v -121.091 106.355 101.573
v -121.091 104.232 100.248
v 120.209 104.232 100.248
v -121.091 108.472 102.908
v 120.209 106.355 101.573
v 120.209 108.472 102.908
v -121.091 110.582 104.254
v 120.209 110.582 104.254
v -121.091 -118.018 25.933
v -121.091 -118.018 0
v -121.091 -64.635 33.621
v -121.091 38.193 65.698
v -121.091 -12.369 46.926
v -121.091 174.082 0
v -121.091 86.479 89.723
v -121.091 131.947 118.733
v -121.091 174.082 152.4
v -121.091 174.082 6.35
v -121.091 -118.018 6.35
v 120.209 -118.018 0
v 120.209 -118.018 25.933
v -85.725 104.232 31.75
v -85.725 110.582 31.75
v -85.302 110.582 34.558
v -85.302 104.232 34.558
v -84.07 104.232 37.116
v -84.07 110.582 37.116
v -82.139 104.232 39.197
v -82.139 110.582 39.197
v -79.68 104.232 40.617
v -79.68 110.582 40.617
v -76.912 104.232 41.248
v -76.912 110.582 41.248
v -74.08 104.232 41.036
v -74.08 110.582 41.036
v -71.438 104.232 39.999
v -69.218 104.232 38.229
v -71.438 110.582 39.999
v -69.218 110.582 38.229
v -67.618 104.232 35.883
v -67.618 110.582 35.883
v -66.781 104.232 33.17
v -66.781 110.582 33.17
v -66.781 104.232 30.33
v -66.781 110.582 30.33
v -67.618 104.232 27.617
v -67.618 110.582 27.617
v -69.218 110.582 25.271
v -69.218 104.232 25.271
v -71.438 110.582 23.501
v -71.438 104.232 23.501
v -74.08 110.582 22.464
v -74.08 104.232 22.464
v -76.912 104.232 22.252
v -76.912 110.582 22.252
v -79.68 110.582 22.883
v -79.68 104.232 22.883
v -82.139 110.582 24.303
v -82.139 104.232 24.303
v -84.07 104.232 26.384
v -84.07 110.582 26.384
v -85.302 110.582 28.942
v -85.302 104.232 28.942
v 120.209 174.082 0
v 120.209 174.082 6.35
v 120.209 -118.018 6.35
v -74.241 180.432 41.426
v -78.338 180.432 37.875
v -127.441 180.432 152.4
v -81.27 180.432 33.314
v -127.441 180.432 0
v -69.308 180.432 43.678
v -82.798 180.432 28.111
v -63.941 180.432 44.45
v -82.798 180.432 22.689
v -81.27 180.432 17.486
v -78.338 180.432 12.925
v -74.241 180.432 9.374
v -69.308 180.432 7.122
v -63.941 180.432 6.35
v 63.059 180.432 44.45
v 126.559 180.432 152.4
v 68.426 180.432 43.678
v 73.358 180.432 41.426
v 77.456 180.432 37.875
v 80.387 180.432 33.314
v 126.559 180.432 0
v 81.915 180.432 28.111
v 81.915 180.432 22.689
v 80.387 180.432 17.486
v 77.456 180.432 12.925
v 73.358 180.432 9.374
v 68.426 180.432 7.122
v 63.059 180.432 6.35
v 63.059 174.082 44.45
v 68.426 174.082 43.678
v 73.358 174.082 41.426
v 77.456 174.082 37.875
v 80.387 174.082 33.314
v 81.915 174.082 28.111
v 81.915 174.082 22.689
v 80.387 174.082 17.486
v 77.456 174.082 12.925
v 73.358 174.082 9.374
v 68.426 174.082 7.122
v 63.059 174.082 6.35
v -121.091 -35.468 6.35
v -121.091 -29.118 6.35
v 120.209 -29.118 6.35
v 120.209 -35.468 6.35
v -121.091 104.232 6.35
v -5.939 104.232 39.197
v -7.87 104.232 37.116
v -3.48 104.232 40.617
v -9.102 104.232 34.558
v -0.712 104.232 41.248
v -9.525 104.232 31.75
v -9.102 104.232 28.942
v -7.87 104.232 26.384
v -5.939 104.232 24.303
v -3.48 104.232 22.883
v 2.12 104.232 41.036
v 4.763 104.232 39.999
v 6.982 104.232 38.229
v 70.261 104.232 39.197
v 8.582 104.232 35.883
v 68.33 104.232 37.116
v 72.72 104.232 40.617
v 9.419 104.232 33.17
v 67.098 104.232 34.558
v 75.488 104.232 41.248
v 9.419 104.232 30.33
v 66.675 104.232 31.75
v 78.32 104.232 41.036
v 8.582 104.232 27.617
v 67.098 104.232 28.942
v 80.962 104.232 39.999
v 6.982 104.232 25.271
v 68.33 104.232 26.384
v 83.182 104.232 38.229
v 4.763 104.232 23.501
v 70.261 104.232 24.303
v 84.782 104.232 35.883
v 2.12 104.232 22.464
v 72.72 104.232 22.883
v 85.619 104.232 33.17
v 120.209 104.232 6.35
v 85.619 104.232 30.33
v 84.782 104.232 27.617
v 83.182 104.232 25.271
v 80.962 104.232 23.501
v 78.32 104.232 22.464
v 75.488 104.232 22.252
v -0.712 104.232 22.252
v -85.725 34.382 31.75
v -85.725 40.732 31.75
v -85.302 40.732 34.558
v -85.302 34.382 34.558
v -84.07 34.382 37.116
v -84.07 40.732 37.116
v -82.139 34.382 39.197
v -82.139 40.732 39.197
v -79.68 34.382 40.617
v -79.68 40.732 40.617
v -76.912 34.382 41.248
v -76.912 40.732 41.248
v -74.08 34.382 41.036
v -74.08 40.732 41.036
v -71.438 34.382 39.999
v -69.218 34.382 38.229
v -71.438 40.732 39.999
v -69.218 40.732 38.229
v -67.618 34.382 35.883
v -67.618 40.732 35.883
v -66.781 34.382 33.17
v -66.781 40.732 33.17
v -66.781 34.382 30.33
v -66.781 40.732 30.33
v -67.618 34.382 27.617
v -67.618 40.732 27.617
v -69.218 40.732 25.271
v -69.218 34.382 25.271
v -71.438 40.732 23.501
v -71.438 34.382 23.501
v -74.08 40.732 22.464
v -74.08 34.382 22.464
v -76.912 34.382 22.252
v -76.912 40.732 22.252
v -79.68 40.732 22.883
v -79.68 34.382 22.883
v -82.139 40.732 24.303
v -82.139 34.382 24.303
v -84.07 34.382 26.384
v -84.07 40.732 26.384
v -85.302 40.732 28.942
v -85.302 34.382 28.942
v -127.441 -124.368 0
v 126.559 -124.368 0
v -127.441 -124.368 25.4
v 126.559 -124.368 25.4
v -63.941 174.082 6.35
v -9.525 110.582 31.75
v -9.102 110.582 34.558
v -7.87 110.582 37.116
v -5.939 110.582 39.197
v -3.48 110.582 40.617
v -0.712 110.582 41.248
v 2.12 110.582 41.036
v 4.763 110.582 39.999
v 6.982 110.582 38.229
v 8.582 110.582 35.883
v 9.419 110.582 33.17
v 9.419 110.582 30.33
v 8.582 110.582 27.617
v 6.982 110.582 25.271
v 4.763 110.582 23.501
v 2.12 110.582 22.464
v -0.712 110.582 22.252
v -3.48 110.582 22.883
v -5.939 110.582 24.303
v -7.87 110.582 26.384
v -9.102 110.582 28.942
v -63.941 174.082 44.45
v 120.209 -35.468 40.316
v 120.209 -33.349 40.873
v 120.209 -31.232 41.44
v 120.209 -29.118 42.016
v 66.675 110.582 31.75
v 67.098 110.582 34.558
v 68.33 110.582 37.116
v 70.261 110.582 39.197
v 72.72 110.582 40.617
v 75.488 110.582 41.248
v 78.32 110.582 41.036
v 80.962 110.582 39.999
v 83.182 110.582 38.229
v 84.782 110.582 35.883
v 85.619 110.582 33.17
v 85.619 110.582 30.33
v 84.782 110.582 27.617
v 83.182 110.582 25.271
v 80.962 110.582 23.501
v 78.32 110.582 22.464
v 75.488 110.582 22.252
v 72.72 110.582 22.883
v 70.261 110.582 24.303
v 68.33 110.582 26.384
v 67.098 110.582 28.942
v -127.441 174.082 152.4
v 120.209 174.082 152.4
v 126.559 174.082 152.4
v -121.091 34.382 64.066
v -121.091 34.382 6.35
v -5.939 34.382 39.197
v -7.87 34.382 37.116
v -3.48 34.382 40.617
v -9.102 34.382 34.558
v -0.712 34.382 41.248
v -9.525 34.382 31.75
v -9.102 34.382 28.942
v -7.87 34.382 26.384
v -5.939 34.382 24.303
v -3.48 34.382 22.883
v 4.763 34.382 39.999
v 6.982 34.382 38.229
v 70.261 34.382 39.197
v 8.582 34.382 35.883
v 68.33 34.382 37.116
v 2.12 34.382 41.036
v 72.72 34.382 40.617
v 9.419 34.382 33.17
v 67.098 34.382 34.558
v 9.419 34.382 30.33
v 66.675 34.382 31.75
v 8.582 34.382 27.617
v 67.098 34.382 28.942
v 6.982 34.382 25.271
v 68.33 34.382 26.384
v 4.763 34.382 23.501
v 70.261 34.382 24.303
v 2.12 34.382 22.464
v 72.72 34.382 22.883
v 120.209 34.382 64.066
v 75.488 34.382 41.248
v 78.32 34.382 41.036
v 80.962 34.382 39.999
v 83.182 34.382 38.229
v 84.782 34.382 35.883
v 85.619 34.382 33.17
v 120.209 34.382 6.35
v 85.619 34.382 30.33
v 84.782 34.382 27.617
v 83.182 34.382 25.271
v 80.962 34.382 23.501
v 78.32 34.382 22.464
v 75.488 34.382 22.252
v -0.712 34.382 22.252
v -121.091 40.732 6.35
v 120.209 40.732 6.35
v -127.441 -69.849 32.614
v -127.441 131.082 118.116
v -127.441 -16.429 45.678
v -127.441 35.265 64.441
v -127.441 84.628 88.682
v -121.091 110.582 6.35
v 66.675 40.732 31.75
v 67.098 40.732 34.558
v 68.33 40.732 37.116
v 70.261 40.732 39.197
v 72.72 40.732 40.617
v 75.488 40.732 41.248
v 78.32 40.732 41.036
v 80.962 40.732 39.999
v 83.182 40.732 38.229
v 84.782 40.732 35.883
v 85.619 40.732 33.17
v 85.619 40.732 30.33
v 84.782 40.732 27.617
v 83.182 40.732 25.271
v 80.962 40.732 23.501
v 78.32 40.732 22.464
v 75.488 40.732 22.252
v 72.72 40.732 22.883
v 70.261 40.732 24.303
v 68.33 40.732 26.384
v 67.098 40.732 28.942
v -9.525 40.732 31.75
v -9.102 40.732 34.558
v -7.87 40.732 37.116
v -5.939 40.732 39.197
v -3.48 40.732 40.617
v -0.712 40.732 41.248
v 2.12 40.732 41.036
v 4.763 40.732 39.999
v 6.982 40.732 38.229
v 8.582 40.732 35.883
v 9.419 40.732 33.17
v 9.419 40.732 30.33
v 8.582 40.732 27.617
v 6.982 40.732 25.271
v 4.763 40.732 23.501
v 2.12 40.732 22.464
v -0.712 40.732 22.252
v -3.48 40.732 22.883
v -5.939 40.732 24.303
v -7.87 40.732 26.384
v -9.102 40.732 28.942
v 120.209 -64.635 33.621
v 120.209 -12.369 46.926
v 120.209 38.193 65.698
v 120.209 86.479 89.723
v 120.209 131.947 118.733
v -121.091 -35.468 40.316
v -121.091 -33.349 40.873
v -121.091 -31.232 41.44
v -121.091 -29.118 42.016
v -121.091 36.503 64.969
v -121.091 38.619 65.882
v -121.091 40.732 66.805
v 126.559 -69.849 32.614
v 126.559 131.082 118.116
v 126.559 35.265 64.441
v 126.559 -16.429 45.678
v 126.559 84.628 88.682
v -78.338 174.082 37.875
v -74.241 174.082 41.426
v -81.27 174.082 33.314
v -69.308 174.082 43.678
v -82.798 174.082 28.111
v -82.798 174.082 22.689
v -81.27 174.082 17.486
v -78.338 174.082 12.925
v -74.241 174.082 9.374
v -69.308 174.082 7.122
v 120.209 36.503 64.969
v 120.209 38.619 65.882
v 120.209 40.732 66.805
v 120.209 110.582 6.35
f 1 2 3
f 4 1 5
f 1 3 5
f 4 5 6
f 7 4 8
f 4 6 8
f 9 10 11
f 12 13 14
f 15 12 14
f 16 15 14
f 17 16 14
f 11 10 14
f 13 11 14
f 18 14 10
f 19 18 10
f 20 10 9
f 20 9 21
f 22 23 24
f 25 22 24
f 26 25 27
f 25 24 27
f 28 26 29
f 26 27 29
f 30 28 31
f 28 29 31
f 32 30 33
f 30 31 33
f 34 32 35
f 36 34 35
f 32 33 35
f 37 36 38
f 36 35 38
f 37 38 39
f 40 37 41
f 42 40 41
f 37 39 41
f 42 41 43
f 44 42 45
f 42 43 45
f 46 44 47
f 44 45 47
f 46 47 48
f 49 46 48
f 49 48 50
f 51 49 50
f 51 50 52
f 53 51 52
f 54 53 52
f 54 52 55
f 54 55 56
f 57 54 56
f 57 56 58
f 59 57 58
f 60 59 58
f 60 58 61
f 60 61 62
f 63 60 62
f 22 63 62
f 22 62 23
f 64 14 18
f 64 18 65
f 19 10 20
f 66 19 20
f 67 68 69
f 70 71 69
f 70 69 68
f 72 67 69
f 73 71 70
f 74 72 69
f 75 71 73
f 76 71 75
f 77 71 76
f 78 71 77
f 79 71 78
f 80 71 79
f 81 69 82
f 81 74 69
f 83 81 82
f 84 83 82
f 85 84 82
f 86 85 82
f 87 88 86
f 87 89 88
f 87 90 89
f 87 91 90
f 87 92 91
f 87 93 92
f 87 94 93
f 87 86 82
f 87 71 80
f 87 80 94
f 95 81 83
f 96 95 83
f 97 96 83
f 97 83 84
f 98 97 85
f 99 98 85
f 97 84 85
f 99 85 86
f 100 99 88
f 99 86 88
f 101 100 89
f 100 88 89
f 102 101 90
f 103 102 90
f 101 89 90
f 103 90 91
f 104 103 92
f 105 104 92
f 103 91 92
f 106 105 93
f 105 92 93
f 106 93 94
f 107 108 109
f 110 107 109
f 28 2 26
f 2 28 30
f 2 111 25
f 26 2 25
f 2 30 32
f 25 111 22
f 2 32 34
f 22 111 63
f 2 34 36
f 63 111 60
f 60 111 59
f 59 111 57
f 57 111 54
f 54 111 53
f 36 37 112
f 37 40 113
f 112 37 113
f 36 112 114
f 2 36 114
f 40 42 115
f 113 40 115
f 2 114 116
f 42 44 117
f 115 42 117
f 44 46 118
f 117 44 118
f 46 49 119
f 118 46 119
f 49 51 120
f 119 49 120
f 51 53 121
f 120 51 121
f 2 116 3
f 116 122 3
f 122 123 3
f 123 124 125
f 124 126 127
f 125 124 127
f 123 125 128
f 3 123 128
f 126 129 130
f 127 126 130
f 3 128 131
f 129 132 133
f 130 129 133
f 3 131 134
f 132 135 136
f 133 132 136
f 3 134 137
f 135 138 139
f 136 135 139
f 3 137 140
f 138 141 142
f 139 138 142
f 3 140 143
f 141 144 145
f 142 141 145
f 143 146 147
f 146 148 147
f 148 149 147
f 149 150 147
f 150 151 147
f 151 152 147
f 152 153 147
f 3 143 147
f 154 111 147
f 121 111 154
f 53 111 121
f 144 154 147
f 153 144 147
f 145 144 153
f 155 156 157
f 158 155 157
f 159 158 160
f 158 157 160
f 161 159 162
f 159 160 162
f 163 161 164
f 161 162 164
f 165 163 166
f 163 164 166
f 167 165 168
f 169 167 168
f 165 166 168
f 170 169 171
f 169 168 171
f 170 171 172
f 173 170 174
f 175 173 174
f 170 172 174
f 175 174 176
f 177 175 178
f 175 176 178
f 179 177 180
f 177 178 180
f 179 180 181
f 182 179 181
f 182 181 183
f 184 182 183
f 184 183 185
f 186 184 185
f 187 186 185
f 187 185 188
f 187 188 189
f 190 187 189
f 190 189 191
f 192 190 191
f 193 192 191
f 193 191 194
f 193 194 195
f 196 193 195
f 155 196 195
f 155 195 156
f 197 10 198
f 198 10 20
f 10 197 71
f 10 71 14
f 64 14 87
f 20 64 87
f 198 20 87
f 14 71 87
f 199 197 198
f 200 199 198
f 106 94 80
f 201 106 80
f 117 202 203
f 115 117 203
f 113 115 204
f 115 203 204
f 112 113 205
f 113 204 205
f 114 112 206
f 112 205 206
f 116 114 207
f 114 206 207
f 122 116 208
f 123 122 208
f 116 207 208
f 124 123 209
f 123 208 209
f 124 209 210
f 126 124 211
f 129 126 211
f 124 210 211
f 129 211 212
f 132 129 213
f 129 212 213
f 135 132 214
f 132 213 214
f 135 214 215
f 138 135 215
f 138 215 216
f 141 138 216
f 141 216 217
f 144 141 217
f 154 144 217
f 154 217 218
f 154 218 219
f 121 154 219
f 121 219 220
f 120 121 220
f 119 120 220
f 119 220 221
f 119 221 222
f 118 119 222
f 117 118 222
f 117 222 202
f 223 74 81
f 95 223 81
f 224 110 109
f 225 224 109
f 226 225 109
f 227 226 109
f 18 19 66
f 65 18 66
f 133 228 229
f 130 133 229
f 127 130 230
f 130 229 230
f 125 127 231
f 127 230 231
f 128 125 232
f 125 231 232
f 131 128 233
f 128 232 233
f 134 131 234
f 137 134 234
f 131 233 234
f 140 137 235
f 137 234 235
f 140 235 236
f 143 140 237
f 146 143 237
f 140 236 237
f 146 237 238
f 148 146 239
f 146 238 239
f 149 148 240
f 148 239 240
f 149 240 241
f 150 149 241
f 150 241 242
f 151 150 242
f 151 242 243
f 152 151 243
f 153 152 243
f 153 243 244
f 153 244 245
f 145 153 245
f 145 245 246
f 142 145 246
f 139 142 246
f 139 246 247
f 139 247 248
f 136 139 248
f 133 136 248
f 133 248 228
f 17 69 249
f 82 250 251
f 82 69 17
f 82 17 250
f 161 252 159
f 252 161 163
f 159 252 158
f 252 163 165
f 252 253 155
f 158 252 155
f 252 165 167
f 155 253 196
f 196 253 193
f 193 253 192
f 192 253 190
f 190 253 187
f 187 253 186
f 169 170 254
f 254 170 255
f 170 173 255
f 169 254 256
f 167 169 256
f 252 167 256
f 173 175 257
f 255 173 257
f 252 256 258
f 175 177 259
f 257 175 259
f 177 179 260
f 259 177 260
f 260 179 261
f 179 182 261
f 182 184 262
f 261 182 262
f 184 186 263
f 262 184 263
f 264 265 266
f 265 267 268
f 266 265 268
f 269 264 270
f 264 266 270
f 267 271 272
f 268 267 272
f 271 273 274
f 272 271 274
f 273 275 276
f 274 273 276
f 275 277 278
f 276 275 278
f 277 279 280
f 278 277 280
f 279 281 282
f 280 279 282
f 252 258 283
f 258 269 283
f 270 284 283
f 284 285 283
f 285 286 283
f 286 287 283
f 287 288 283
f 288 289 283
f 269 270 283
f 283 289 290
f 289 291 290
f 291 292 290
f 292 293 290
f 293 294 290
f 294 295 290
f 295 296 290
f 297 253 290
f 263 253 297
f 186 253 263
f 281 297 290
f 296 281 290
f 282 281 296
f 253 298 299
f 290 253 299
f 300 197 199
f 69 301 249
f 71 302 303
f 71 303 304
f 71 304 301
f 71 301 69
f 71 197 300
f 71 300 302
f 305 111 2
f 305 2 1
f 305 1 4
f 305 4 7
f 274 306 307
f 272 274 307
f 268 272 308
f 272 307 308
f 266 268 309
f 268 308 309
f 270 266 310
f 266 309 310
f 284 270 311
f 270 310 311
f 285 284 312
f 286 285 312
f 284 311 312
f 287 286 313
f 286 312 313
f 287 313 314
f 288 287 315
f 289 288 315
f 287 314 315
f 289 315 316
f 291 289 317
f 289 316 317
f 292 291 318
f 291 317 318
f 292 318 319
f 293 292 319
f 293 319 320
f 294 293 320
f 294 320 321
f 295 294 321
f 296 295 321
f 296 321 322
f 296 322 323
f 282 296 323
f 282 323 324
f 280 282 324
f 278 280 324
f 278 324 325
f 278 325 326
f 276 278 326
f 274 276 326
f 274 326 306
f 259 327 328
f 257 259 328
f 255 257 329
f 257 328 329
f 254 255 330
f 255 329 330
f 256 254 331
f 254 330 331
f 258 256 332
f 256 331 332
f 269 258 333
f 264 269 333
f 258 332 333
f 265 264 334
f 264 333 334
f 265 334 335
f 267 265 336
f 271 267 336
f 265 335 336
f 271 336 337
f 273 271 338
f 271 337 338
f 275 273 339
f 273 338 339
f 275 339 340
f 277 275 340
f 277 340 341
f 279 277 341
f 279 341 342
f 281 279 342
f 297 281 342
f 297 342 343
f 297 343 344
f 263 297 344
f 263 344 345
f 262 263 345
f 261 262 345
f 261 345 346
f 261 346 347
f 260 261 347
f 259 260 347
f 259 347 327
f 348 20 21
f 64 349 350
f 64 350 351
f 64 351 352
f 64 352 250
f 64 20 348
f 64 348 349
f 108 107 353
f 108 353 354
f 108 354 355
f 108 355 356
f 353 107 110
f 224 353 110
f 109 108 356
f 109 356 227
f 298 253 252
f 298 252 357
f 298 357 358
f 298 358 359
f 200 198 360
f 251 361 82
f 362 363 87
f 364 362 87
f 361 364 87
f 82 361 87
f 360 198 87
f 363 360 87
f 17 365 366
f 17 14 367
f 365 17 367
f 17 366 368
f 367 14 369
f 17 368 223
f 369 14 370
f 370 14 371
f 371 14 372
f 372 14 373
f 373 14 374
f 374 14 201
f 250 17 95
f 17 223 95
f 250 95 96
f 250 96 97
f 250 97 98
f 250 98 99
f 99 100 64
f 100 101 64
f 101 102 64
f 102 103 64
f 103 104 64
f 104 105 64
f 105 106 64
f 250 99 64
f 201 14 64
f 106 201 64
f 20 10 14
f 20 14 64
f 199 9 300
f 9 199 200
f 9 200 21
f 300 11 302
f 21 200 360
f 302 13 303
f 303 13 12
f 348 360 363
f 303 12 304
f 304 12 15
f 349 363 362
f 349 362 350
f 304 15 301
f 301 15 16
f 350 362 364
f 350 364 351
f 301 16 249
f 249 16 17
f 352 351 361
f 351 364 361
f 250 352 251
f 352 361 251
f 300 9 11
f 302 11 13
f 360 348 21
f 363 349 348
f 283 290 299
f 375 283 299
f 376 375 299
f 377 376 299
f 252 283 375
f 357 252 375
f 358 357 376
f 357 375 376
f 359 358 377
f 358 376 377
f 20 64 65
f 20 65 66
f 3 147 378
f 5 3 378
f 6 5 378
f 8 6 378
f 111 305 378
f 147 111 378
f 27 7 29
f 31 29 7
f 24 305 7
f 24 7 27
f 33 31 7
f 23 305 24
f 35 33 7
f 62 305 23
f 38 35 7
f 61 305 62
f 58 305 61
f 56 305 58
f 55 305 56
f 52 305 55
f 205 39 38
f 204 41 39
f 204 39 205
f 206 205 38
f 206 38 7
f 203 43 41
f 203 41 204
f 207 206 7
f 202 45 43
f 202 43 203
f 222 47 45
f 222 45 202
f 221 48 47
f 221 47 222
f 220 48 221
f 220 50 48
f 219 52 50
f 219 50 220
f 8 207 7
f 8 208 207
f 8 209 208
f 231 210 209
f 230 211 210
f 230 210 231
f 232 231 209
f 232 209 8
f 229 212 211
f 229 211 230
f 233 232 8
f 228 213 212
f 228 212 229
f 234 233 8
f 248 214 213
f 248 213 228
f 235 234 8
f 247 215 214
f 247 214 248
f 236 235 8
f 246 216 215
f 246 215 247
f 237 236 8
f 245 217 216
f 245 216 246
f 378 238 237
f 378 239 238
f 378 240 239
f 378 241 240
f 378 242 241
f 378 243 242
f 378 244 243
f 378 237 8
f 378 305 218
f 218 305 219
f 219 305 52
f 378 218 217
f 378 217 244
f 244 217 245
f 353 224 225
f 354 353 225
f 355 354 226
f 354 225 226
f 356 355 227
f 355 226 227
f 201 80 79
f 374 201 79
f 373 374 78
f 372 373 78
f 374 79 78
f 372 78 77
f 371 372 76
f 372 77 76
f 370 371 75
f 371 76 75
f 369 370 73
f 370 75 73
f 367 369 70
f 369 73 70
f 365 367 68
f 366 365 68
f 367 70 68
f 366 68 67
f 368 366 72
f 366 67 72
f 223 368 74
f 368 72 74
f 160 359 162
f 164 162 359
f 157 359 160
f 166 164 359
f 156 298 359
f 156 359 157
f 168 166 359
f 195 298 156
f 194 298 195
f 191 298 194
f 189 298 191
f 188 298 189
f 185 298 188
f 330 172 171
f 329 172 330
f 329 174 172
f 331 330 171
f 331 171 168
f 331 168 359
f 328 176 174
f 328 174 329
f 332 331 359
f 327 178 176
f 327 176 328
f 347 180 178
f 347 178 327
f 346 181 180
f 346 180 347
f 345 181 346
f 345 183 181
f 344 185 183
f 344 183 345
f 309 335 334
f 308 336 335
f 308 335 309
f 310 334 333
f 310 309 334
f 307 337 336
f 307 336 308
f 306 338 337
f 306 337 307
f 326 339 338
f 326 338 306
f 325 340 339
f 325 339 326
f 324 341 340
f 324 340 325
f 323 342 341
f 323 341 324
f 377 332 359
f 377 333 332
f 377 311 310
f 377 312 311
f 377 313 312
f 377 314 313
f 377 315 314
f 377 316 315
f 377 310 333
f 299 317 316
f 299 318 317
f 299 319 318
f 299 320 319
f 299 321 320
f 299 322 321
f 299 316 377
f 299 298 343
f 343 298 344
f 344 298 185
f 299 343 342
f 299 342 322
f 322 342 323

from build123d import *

# Parameters (mm, degrees)
F0_W          = 254
F0_H          = 304.8
F0_W_2        = 241.3
F0_H_2        = 292.1
F1_DEPTH      = 152.4
F3_DEPTH      = 254
F4_W          = 241.3
F4_H          = 292.1
F5_DEPTH      = 6.35
F7_END_RADIUS = 508
F6_W          = 241.3
F6_H          = 6.35
F7_REACH      = 387.4345381711
F9_DEPTH      = 12.7
F10_R         = 9.525
F11_DEPTH     = 99.06
F12_R         = 9.525
F13_DEPTH     = 25.4


# Not quite as in the source:
# - a feature names something its author has since deleted; it is built from what else it names


with BuildPart() as f1:
    # F0 (on Top) → F1 (new body)
    with BuildSketch(Plane.XY):
        with Locations((-0.4414357245, 28.0319261778)):
            Rectangle(F0_W, F0_H)
        with Locations((-0.4414357245, 28.0319261778)):
            Rectangle(F0_W_2, F0_H_2, mode=Mode.SUBTRACT)
    extrude(amount=F1_DEPTH)

    # F2 (on face) → F3 (cut, through all)
    with BuildSketch(Plane.YZ.offset(126.5585642755)):
        with BuildLine():
            Line((-124.3680738222, 152.4), (-124.3680738222, 25.4))
            ThreePointArc((-124.3680738222, 25.4), (35.2650996978, 64.440792228), (174.0819261778, 152.4))
            Line((174.0819261778, 152.4), (-124.3680738222, 152.4))
        make_face()
    extrude(amount=-F3_DEPTH, mode=Mode.SUBTRACT)

    # F8 (on face) → F9 (cut)
    with BuildSketch(Plane(origin=(0, 180.4319261778, 0), x_dir=(-1, 0, 0), z_dir=(0, 1, 0))):
        with BuildLine():
            Line((63.9414357245, 44.45), (-63.0585642755, 44.45))
            ThreePointArc((-63.0585642755, 44.45), (-82.1085642755, 25.4), (-63.0585642755, 6.35))
            Line((-63.0585642755, 6.35), (63.9414357245, 6.35))
            ThreePointArc((63.9414357245, 6.35), (82.9914357245, 25.4), (63.9414357245, 44.45))
        make_face()
    extrude(amount=-F9_DEPTH, mode=Mode.SUBTRACT)

    # F12 (on face) → F13 (cut)
    with BuildSketch(Plane(origin=(0, 40.7319261778, 0), x_dir=(-1, 0, 0), z_dir=(0, 1, 0))):
        with Locations((0, 31.75)):
            Circle(F12_R)
        with Locations((-76.2, 31.75)):
            Circle(F12_R)
        with Locations((76.2, 31.75)):
            Circle(F12_R)
    extrude(amount=-F13_DEPTH, mode=Mode.SUBTRACT)


with BuildPart() as f5:
    # F4 (on face) → F5 (new body)
    with BuildSketch(Plane(origin=(0, 0, 0), x_dir=(1, 0, 0), z_dir=(0, 0, -1))):
        with Locations((-0.4414357245, -28.0319261778)):
            Rectangle(F4_W, F4_H)
    extrude(amount=-F5_DEPTH)


with BuildPart() as f7:
    f7_end = (Plane(origin=(-0.4414357245, -163.6449236636, 531.8793471273), x_dir=(0, 0, 1), z_dir=(1, 0, 0)) * Cylinder(F7_END_RADIUS, 1624.9156633008, mode=Mode.PRIVATE)).faces().sort_by_distance((122.4388870733, 35.2650996978, 64.440792228))[0]
    # F6 (on face) → F7 (new body, up to the whole of a round face its end follows)
    with BuildSketch(Plane.XY.offset(6.35)):
        with Locations((-0.4414357245, 37.5569261778)):
            Rectangle(F6_W, F6_H)
    f7_long = extrude(amount=F7_REACH, mode=Mode.PRIVATE)
    add(split(f7_long, bisect_by=f7_end, keep=Keep.TOP, mode=Mode.PRIVATE))


with BuildPart() as f7b:
    f7_2_end = (Plane(origin=(-0.4414357245, -163.6449236636, 531.8793471273), x_dir=(0, 0, 1), z_dir=(1, 0, 0)) * Cylinder(F7_END_RADIUS, 1624.9156633008, mode=Mode.PRIVATE)).faces().sort_by_distance((122.4388870733, 35.2650996978, 64.440792228))[0]
    # F6 (on face) → F7, piece 2 (new body, up to the whole of a round face its end follows)
    with BuildSketch(Plane.XY.offset(6.35)):
        with Locations((-0.4414357245, 107.4069261778)):
            Rectangle(F6_W, F6_H)
    f7_2_long = extrude(amount=F7_REACH, mode=Mode.PRIVATE)
    add(split(f7_2_long, bisect_by=f7_2_end, keep=Keep.TOP, mode=Mode.PRIVATE))


with BuildPart() as f7c:
    f7_3_end = (Plane(origin=(-0.4414357245, -163.6449236636, 531.8793471273), x_dir=(0, 0, 1), z_dir=(1, 0, 0)) * Cylinder(F7_END_RADIUS, 1624.9156633008, mode=Mode.PRIVATE)).faces().sort_by_distance((122.4388870733, 35.2650996978, 64.440792228))[0]
    # F6 (on face) → F7, piece 3 (new body, up to the whole of a round face its end follows)
    with BuildSketch(Plane.XY.offset(6.35)):
        with Locations((-0.4414357245, -32.2930738222)):
            Rectangle(F6_W, F6_H)
    f7_3_long = extrude(amount=F7_REACH, mode=Mode.PRIVATE)
    add(split(f7_3_long, bisect_by=f7_3_end, keep=Keep.TOP, mode=Mode.PRIVATE))


with BuildPart() as f11_tool:
    # F10 (on face) → F11 (new body)
    with BuildSketch(Plane(origin=(0, 110.5819261778, 0), x_dir=(-1, 0, 0), z_dir=(0, 1, 0))):
        with Locations((76.2, 31.75)):
            Circle(F10_R)
        with Locations((0, 31.75)):
            Circle(F10_R)
        with Locations((-76.2, 31.75)):
            Circle(F10_R)
    extrude(amount=-F11_DEPTH)


with BuildPart() as f7_1:
    add(f7.part)

    # F11: cut by f11_tool
    add(f11_tool.part, mode=Mode.SUBTRACT)


with BuildPart() as f7b_1:
    add(f7b.part)

    # F11: cut by f11_tool
    add(f11_tool.part, mode=Mode.SUBTRACT)


solid = Compound([f1.part, f5.part, f7c.part, f7_1.part, f7b_1.part])
